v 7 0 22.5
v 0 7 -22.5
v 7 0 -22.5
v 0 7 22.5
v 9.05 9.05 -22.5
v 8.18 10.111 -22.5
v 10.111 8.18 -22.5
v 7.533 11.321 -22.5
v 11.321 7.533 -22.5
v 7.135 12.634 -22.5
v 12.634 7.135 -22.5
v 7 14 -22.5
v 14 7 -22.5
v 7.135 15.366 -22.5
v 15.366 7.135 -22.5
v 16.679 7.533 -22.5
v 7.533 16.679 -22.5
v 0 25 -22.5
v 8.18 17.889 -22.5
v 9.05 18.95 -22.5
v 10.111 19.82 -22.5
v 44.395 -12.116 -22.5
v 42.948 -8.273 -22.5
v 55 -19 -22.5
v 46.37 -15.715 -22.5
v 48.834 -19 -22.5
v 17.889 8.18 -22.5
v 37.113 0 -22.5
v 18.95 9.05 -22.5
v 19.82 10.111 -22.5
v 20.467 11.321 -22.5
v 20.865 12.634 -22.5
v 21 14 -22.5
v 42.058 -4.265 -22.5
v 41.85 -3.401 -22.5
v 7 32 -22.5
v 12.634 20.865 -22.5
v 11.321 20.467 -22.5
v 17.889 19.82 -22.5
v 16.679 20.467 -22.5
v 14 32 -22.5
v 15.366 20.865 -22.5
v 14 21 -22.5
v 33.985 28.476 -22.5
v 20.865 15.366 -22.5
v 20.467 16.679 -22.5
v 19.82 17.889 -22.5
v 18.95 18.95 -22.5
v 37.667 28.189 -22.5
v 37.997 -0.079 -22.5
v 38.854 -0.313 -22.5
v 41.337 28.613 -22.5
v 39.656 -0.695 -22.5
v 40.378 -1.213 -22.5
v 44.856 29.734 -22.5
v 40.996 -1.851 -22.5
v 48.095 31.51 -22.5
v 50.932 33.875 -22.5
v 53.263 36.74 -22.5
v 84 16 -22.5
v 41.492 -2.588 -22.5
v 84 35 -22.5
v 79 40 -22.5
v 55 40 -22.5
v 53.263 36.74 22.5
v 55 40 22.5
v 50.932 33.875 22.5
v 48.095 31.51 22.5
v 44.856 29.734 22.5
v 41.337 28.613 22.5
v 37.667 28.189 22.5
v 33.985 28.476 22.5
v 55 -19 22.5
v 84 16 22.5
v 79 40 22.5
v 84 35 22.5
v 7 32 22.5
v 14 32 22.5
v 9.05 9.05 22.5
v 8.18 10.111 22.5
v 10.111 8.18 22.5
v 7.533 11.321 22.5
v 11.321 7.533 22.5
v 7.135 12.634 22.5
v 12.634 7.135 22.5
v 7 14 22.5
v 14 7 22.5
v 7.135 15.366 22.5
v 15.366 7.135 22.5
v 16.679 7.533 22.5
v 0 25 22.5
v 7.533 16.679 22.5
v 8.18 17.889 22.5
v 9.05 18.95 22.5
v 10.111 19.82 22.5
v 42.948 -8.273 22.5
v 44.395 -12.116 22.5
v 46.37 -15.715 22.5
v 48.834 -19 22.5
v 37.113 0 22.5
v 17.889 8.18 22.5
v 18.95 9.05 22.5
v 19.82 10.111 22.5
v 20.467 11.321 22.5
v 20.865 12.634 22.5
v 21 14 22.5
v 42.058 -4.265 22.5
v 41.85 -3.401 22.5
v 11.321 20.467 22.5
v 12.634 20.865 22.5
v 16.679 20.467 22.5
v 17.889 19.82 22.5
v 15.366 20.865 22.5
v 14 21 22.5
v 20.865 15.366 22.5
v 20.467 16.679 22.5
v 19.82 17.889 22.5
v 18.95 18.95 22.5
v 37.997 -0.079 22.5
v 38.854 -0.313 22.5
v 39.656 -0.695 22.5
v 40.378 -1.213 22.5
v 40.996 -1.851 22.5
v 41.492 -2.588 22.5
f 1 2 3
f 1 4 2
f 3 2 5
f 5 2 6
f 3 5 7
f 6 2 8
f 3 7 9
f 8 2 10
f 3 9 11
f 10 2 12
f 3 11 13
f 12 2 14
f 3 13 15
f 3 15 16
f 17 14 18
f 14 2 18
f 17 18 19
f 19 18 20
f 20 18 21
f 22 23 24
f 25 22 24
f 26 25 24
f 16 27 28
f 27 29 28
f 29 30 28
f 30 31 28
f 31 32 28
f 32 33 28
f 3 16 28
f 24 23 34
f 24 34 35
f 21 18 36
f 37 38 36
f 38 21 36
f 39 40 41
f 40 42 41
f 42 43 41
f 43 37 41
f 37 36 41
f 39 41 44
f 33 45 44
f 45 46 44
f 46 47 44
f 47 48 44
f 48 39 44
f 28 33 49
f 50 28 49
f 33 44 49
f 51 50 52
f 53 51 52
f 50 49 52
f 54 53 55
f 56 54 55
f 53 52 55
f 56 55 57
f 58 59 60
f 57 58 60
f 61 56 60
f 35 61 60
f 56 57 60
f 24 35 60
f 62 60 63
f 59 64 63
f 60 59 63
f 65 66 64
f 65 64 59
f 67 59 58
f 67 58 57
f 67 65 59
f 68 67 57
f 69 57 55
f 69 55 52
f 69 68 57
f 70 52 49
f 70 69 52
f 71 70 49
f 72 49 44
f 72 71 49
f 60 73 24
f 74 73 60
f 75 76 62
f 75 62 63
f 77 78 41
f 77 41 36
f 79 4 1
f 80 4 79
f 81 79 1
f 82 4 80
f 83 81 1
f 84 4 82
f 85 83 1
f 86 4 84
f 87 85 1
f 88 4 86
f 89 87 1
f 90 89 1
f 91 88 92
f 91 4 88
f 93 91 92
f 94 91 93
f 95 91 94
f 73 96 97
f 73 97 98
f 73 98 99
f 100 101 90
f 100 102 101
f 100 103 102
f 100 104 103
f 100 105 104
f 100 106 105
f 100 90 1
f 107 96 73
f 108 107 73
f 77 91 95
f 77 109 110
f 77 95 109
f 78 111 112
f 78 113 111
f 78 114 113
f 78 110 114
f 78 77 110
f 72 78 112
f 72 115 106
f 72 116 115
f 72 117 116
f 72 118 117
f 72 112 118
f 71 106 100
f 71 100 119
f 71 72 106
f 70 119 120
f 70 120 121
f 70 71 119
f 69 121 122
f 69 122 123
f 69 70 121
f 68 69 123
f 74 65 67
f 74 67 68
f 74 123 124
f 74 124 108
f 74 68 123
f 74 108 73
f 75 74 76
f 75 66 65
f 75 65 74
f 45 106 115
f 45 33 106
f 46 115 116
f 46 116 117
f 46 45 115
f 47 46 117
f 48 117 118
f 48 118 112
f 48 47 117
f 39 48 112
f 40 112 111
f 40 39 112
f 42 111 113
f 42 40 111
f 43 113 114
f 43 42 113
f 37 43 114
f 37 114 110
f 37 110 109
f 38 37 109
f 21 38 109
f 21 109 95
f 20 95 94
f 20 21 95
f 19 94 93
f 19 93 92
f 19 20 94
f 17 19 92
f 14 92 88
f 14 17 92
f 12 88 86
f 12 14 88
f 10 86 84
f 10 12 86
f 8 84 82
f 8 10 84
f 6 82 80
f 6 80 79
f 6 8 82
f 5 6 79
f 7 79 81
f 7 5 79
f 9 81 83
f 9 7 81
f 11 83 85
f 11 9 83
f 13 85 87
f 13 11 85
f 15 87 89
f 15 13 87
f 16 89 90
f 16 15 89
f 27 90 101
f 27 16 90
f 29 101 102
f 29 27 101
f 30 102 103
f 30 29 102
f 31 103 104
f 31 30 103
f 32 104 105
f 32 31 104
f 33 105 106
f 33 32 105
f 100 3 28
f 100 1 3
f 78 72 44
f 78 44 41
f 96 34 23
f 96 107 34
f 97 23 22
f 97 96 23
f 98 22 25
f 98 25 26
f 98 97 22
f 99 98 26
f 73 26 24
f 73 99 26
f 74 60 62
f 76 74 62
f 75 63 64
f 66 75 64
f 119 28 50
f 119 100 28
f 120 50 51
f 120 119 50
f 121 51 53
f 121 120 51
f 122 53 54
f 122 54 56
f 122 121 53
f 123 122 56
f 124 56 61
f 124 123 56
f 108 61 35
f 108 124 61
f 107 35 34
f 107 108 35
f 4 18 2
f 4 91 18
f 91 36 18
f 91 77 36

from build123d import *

# Parameters (mm, degrees)
ESQUISSE2_R        = 7
BOSS_EXTRU_2_DEPTH = 22.5


with BuildPart() as part:
    # Esquisse2 → Boss.-Extru.2 (new body, symmetric)
    with BuildSketch(Plane.XY):
        with BuildLine():
            Line((48.833954843, -19), (55, -19))
            Line((55, -19), (84, 16))
            Line((84, 16), (84, 35))
            Line((84, 35), (79, 40))
            Line((79, 40), (55, 40))
            ThreePointArc((55, 40), (46.518108988, 30.544085173), (33.984940886, 28.476115714))
            Line((33.984940886, 28.476115714), (14, 32))
            Line((14, 32), (7, 32))
            Line((7, 32), (0, 25))
            Line((0, 25), (0, 7))
            Line((0, 7), (7, 0))
            Line((7, 0), (37.112513701, 0))
            ThreePointArc((37.112513701, 0), (40.377749482, -1.213413768), (42.058152443, -4.264705882))
            ThreePointArc((42.058152443, -4.264705882), (44.394982646, -12.115672061), (48.833954843, -19))
        make_face()
        with Locations((14, 14)):
            Circle(ESQUISSE2_R, mode=Mode.SUBTRACT)
    extrude(amount=BOSS_EXTRU_2_DEPTH, both=True)


solid = part.part
